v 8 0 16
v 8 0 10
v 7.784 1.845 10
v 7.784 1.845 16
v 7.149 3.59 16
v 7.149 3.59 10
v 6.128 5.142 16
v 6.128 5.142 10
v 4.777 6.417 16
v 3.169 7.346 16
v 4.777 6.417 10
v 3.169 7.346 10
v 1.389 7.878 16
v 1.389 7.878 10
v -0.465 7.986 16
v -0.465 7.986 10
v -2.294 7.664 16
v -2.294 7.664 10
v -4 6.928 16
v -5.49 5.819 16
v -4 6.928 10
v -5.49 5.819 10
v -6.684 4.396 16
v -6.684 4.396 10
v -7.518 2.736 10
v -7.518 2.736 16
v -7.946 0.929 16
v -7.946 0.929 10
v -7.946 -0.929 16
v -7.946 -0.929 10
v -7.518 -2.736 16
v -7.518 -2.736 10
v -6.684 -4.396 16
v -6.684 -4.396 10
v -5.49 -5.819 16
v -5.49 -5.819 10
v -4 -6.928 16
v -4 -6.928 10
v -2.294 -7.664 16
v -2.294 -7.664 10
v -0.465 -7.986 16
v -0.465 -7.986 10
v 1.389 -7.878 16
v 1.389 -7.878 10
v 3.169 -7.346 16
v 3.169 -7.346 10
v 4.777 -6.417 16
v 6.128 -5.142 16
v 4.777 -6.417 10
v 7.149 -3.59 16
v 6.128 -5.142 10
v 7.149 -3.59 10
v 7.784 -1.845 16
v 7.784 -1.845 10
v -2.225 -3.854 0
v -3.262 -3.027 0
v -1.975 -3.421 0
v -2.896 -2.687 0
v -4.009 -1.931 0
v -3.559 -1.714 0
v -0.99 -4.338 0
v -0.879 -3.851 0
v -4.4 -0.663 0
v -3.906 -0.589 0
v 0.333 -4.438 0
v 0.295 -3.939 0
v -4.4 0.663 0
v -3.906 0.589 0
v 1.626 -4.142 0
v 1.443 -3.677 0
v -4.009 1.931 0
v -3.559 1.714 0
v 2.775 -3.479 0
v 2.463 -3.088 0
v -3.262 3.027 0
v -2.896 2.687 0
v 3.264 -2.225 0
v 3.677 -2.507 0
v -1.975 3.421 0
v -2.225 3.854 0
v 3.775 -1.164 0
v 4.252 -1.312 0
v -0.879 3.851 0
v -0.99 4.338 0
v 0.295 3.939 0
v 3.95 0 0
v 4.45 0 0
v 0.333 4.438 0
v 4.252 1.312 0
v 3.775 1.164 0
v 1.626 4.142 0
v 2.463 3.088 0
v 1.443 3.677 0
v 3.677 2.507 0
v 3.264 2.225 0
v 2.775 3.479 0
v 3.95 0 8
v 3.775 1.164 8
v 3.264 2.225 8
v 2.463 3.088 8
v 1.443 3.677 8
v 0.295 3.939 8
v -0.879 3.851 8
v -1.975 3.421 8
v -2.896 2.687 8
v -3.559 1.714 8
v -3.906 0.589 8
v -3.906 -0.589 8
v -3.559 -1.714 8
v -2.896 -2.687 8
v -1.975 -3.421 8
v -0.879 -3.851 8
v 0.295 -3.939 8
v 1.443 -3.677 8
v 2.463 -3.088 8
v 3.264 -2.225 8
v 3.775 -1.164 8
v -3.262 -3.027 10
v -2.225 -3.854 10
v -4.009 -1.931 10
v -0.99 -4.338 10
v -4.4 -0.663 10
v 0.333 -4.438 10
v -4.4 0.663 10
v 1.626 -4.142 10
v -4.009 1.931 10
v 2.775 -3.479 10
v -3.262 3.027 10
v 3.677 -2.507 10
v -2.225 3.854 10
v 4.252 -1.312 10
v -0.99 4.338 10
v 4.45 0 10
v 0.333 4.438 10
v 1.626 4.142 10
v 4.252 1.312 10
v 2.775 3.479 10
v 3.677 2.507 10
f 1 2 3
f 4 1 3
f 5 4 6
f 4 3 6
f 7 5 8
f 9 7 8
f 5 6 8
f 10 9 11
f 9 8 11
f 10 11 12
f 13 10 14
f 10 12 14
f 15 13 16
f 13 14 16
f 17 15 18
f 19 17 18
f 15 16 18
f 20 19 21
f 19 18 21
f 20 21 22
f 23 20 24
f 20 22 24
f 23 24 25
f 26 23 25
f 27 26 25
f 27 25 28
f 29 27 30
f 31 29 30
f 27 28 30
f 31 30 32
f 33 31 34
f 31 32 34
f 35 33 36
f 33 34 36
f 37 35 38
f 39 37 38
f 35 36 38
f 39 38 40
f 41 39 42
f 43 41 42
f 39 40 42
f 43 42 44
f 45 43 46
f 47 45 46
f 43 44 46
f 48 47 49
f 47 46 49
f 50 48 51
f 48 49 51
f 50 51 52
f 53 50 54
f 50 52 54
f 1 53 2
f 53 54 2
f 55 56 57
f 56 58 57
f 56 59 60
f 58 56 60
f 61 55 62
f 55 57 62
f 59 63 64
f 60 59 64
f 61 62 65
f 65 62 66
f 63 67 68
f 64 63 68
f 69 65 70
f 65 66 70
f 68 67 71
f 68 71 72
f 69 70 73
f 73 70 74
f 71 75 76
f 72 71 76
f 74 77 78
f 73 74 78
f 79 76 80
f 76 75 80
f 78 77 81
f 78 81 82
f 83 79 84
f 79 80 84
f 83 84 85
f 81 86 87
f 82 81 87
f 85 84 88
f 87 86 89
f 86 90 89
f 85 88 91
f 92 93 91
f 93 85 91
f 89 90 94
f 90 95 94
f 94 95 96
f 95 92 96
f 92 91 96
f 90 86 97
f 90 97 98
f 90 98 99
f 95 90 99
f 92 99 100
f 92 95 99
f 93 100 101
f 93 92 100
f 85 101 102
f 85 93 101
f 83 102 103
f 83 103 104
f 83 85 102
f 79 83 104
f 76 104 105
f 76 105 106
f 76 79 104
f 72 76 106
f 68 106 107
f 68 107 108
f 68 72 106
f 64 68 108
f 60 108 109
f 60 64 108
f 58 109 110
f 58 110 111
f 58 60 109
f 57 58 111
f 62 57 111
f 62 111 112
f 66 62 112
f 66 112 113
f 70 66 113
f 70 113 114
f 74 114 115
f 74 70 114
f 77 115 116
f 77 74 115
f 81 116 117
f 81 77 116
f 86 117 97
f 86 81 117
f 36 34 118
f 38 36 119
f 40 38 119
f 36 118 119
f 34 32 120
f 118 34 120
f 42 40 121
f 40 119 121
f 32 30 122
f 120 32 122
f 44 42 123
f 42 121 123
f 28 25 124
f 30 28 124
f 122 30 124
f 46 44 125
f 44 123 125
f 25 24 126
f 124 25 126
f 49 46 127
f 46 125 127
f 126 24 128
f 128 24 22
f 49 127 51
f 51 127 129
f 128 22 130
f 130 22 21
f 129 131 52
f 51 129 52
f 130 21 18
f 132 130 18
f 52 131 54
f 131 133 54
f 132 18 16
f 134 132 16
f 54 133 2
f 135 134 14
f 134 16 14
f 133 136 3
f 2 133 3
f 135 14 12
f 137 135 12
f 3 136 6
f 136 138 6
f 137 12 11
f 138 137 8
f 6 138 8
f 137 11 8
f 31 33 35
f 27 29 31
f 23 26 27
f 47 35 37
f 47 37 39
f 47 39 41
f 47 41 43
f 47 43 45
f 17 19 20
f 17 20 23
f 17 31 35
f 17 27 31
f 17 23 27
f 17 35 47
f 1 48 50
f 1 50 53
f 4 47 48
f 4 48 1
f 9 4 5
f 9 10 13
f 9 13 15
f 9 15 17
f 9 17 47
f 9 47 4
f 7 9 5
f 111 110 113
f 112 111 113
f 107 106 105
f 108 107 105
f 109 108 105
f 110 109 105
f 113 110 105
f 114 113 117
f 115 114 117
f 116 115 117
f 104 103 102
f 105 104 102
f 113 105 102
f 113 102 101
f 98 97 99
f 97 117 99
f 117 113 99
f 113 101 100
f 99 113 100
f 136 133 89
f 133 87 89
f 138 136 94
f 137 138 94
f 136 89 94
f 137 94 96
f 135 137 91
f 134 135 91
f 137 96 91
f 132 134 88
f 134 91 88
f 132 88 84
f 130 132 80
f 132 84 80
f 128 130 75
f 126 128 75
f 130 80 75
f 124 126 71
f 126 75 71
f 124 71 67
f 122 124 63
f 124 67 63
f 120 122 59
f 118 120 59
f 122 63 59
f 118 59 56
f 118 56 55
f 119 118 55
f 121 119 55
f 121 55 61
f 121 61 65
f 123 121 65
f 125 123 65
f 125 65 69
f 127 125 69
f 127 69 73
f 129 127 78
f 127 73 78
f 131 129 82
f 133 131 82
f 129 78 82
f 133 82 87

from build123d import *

# Parameters (mm, degrees)
F0_R     = 4.45
F0_R_2   = 3.95
F1_DEPTH = 8
F2_R     = 4.45
F3_DEPTH = 2
F4_R     = 8
F5_DEPTH = 6


# Not quite as in the source:
# - a feature names something its author has since deleted; it is built from what else it names


with BuildPart() as f1:
    # F0 (on Top) → F1 (new body)
    with BuildSketch(Plane.XY):
        Circle(F0_R)
        Circle(F0_R_2, mode=Mode.SUBTRACT)
    extrude(amount=F1_DEPTH)

    # F2 (on face) → F3 (join)
    with BuildSketch(Plane.XY.offset(8)):
        Circle(F2_R)
    extrude(amount=F3_DEPTH)

    # F4 (on face) → F5 (join)
    with BuildSketch(Plane.XY.offset(10)):
        Circle(F4_R)
    extrude(amount=F5_DEPTH)


solid = f1.part
